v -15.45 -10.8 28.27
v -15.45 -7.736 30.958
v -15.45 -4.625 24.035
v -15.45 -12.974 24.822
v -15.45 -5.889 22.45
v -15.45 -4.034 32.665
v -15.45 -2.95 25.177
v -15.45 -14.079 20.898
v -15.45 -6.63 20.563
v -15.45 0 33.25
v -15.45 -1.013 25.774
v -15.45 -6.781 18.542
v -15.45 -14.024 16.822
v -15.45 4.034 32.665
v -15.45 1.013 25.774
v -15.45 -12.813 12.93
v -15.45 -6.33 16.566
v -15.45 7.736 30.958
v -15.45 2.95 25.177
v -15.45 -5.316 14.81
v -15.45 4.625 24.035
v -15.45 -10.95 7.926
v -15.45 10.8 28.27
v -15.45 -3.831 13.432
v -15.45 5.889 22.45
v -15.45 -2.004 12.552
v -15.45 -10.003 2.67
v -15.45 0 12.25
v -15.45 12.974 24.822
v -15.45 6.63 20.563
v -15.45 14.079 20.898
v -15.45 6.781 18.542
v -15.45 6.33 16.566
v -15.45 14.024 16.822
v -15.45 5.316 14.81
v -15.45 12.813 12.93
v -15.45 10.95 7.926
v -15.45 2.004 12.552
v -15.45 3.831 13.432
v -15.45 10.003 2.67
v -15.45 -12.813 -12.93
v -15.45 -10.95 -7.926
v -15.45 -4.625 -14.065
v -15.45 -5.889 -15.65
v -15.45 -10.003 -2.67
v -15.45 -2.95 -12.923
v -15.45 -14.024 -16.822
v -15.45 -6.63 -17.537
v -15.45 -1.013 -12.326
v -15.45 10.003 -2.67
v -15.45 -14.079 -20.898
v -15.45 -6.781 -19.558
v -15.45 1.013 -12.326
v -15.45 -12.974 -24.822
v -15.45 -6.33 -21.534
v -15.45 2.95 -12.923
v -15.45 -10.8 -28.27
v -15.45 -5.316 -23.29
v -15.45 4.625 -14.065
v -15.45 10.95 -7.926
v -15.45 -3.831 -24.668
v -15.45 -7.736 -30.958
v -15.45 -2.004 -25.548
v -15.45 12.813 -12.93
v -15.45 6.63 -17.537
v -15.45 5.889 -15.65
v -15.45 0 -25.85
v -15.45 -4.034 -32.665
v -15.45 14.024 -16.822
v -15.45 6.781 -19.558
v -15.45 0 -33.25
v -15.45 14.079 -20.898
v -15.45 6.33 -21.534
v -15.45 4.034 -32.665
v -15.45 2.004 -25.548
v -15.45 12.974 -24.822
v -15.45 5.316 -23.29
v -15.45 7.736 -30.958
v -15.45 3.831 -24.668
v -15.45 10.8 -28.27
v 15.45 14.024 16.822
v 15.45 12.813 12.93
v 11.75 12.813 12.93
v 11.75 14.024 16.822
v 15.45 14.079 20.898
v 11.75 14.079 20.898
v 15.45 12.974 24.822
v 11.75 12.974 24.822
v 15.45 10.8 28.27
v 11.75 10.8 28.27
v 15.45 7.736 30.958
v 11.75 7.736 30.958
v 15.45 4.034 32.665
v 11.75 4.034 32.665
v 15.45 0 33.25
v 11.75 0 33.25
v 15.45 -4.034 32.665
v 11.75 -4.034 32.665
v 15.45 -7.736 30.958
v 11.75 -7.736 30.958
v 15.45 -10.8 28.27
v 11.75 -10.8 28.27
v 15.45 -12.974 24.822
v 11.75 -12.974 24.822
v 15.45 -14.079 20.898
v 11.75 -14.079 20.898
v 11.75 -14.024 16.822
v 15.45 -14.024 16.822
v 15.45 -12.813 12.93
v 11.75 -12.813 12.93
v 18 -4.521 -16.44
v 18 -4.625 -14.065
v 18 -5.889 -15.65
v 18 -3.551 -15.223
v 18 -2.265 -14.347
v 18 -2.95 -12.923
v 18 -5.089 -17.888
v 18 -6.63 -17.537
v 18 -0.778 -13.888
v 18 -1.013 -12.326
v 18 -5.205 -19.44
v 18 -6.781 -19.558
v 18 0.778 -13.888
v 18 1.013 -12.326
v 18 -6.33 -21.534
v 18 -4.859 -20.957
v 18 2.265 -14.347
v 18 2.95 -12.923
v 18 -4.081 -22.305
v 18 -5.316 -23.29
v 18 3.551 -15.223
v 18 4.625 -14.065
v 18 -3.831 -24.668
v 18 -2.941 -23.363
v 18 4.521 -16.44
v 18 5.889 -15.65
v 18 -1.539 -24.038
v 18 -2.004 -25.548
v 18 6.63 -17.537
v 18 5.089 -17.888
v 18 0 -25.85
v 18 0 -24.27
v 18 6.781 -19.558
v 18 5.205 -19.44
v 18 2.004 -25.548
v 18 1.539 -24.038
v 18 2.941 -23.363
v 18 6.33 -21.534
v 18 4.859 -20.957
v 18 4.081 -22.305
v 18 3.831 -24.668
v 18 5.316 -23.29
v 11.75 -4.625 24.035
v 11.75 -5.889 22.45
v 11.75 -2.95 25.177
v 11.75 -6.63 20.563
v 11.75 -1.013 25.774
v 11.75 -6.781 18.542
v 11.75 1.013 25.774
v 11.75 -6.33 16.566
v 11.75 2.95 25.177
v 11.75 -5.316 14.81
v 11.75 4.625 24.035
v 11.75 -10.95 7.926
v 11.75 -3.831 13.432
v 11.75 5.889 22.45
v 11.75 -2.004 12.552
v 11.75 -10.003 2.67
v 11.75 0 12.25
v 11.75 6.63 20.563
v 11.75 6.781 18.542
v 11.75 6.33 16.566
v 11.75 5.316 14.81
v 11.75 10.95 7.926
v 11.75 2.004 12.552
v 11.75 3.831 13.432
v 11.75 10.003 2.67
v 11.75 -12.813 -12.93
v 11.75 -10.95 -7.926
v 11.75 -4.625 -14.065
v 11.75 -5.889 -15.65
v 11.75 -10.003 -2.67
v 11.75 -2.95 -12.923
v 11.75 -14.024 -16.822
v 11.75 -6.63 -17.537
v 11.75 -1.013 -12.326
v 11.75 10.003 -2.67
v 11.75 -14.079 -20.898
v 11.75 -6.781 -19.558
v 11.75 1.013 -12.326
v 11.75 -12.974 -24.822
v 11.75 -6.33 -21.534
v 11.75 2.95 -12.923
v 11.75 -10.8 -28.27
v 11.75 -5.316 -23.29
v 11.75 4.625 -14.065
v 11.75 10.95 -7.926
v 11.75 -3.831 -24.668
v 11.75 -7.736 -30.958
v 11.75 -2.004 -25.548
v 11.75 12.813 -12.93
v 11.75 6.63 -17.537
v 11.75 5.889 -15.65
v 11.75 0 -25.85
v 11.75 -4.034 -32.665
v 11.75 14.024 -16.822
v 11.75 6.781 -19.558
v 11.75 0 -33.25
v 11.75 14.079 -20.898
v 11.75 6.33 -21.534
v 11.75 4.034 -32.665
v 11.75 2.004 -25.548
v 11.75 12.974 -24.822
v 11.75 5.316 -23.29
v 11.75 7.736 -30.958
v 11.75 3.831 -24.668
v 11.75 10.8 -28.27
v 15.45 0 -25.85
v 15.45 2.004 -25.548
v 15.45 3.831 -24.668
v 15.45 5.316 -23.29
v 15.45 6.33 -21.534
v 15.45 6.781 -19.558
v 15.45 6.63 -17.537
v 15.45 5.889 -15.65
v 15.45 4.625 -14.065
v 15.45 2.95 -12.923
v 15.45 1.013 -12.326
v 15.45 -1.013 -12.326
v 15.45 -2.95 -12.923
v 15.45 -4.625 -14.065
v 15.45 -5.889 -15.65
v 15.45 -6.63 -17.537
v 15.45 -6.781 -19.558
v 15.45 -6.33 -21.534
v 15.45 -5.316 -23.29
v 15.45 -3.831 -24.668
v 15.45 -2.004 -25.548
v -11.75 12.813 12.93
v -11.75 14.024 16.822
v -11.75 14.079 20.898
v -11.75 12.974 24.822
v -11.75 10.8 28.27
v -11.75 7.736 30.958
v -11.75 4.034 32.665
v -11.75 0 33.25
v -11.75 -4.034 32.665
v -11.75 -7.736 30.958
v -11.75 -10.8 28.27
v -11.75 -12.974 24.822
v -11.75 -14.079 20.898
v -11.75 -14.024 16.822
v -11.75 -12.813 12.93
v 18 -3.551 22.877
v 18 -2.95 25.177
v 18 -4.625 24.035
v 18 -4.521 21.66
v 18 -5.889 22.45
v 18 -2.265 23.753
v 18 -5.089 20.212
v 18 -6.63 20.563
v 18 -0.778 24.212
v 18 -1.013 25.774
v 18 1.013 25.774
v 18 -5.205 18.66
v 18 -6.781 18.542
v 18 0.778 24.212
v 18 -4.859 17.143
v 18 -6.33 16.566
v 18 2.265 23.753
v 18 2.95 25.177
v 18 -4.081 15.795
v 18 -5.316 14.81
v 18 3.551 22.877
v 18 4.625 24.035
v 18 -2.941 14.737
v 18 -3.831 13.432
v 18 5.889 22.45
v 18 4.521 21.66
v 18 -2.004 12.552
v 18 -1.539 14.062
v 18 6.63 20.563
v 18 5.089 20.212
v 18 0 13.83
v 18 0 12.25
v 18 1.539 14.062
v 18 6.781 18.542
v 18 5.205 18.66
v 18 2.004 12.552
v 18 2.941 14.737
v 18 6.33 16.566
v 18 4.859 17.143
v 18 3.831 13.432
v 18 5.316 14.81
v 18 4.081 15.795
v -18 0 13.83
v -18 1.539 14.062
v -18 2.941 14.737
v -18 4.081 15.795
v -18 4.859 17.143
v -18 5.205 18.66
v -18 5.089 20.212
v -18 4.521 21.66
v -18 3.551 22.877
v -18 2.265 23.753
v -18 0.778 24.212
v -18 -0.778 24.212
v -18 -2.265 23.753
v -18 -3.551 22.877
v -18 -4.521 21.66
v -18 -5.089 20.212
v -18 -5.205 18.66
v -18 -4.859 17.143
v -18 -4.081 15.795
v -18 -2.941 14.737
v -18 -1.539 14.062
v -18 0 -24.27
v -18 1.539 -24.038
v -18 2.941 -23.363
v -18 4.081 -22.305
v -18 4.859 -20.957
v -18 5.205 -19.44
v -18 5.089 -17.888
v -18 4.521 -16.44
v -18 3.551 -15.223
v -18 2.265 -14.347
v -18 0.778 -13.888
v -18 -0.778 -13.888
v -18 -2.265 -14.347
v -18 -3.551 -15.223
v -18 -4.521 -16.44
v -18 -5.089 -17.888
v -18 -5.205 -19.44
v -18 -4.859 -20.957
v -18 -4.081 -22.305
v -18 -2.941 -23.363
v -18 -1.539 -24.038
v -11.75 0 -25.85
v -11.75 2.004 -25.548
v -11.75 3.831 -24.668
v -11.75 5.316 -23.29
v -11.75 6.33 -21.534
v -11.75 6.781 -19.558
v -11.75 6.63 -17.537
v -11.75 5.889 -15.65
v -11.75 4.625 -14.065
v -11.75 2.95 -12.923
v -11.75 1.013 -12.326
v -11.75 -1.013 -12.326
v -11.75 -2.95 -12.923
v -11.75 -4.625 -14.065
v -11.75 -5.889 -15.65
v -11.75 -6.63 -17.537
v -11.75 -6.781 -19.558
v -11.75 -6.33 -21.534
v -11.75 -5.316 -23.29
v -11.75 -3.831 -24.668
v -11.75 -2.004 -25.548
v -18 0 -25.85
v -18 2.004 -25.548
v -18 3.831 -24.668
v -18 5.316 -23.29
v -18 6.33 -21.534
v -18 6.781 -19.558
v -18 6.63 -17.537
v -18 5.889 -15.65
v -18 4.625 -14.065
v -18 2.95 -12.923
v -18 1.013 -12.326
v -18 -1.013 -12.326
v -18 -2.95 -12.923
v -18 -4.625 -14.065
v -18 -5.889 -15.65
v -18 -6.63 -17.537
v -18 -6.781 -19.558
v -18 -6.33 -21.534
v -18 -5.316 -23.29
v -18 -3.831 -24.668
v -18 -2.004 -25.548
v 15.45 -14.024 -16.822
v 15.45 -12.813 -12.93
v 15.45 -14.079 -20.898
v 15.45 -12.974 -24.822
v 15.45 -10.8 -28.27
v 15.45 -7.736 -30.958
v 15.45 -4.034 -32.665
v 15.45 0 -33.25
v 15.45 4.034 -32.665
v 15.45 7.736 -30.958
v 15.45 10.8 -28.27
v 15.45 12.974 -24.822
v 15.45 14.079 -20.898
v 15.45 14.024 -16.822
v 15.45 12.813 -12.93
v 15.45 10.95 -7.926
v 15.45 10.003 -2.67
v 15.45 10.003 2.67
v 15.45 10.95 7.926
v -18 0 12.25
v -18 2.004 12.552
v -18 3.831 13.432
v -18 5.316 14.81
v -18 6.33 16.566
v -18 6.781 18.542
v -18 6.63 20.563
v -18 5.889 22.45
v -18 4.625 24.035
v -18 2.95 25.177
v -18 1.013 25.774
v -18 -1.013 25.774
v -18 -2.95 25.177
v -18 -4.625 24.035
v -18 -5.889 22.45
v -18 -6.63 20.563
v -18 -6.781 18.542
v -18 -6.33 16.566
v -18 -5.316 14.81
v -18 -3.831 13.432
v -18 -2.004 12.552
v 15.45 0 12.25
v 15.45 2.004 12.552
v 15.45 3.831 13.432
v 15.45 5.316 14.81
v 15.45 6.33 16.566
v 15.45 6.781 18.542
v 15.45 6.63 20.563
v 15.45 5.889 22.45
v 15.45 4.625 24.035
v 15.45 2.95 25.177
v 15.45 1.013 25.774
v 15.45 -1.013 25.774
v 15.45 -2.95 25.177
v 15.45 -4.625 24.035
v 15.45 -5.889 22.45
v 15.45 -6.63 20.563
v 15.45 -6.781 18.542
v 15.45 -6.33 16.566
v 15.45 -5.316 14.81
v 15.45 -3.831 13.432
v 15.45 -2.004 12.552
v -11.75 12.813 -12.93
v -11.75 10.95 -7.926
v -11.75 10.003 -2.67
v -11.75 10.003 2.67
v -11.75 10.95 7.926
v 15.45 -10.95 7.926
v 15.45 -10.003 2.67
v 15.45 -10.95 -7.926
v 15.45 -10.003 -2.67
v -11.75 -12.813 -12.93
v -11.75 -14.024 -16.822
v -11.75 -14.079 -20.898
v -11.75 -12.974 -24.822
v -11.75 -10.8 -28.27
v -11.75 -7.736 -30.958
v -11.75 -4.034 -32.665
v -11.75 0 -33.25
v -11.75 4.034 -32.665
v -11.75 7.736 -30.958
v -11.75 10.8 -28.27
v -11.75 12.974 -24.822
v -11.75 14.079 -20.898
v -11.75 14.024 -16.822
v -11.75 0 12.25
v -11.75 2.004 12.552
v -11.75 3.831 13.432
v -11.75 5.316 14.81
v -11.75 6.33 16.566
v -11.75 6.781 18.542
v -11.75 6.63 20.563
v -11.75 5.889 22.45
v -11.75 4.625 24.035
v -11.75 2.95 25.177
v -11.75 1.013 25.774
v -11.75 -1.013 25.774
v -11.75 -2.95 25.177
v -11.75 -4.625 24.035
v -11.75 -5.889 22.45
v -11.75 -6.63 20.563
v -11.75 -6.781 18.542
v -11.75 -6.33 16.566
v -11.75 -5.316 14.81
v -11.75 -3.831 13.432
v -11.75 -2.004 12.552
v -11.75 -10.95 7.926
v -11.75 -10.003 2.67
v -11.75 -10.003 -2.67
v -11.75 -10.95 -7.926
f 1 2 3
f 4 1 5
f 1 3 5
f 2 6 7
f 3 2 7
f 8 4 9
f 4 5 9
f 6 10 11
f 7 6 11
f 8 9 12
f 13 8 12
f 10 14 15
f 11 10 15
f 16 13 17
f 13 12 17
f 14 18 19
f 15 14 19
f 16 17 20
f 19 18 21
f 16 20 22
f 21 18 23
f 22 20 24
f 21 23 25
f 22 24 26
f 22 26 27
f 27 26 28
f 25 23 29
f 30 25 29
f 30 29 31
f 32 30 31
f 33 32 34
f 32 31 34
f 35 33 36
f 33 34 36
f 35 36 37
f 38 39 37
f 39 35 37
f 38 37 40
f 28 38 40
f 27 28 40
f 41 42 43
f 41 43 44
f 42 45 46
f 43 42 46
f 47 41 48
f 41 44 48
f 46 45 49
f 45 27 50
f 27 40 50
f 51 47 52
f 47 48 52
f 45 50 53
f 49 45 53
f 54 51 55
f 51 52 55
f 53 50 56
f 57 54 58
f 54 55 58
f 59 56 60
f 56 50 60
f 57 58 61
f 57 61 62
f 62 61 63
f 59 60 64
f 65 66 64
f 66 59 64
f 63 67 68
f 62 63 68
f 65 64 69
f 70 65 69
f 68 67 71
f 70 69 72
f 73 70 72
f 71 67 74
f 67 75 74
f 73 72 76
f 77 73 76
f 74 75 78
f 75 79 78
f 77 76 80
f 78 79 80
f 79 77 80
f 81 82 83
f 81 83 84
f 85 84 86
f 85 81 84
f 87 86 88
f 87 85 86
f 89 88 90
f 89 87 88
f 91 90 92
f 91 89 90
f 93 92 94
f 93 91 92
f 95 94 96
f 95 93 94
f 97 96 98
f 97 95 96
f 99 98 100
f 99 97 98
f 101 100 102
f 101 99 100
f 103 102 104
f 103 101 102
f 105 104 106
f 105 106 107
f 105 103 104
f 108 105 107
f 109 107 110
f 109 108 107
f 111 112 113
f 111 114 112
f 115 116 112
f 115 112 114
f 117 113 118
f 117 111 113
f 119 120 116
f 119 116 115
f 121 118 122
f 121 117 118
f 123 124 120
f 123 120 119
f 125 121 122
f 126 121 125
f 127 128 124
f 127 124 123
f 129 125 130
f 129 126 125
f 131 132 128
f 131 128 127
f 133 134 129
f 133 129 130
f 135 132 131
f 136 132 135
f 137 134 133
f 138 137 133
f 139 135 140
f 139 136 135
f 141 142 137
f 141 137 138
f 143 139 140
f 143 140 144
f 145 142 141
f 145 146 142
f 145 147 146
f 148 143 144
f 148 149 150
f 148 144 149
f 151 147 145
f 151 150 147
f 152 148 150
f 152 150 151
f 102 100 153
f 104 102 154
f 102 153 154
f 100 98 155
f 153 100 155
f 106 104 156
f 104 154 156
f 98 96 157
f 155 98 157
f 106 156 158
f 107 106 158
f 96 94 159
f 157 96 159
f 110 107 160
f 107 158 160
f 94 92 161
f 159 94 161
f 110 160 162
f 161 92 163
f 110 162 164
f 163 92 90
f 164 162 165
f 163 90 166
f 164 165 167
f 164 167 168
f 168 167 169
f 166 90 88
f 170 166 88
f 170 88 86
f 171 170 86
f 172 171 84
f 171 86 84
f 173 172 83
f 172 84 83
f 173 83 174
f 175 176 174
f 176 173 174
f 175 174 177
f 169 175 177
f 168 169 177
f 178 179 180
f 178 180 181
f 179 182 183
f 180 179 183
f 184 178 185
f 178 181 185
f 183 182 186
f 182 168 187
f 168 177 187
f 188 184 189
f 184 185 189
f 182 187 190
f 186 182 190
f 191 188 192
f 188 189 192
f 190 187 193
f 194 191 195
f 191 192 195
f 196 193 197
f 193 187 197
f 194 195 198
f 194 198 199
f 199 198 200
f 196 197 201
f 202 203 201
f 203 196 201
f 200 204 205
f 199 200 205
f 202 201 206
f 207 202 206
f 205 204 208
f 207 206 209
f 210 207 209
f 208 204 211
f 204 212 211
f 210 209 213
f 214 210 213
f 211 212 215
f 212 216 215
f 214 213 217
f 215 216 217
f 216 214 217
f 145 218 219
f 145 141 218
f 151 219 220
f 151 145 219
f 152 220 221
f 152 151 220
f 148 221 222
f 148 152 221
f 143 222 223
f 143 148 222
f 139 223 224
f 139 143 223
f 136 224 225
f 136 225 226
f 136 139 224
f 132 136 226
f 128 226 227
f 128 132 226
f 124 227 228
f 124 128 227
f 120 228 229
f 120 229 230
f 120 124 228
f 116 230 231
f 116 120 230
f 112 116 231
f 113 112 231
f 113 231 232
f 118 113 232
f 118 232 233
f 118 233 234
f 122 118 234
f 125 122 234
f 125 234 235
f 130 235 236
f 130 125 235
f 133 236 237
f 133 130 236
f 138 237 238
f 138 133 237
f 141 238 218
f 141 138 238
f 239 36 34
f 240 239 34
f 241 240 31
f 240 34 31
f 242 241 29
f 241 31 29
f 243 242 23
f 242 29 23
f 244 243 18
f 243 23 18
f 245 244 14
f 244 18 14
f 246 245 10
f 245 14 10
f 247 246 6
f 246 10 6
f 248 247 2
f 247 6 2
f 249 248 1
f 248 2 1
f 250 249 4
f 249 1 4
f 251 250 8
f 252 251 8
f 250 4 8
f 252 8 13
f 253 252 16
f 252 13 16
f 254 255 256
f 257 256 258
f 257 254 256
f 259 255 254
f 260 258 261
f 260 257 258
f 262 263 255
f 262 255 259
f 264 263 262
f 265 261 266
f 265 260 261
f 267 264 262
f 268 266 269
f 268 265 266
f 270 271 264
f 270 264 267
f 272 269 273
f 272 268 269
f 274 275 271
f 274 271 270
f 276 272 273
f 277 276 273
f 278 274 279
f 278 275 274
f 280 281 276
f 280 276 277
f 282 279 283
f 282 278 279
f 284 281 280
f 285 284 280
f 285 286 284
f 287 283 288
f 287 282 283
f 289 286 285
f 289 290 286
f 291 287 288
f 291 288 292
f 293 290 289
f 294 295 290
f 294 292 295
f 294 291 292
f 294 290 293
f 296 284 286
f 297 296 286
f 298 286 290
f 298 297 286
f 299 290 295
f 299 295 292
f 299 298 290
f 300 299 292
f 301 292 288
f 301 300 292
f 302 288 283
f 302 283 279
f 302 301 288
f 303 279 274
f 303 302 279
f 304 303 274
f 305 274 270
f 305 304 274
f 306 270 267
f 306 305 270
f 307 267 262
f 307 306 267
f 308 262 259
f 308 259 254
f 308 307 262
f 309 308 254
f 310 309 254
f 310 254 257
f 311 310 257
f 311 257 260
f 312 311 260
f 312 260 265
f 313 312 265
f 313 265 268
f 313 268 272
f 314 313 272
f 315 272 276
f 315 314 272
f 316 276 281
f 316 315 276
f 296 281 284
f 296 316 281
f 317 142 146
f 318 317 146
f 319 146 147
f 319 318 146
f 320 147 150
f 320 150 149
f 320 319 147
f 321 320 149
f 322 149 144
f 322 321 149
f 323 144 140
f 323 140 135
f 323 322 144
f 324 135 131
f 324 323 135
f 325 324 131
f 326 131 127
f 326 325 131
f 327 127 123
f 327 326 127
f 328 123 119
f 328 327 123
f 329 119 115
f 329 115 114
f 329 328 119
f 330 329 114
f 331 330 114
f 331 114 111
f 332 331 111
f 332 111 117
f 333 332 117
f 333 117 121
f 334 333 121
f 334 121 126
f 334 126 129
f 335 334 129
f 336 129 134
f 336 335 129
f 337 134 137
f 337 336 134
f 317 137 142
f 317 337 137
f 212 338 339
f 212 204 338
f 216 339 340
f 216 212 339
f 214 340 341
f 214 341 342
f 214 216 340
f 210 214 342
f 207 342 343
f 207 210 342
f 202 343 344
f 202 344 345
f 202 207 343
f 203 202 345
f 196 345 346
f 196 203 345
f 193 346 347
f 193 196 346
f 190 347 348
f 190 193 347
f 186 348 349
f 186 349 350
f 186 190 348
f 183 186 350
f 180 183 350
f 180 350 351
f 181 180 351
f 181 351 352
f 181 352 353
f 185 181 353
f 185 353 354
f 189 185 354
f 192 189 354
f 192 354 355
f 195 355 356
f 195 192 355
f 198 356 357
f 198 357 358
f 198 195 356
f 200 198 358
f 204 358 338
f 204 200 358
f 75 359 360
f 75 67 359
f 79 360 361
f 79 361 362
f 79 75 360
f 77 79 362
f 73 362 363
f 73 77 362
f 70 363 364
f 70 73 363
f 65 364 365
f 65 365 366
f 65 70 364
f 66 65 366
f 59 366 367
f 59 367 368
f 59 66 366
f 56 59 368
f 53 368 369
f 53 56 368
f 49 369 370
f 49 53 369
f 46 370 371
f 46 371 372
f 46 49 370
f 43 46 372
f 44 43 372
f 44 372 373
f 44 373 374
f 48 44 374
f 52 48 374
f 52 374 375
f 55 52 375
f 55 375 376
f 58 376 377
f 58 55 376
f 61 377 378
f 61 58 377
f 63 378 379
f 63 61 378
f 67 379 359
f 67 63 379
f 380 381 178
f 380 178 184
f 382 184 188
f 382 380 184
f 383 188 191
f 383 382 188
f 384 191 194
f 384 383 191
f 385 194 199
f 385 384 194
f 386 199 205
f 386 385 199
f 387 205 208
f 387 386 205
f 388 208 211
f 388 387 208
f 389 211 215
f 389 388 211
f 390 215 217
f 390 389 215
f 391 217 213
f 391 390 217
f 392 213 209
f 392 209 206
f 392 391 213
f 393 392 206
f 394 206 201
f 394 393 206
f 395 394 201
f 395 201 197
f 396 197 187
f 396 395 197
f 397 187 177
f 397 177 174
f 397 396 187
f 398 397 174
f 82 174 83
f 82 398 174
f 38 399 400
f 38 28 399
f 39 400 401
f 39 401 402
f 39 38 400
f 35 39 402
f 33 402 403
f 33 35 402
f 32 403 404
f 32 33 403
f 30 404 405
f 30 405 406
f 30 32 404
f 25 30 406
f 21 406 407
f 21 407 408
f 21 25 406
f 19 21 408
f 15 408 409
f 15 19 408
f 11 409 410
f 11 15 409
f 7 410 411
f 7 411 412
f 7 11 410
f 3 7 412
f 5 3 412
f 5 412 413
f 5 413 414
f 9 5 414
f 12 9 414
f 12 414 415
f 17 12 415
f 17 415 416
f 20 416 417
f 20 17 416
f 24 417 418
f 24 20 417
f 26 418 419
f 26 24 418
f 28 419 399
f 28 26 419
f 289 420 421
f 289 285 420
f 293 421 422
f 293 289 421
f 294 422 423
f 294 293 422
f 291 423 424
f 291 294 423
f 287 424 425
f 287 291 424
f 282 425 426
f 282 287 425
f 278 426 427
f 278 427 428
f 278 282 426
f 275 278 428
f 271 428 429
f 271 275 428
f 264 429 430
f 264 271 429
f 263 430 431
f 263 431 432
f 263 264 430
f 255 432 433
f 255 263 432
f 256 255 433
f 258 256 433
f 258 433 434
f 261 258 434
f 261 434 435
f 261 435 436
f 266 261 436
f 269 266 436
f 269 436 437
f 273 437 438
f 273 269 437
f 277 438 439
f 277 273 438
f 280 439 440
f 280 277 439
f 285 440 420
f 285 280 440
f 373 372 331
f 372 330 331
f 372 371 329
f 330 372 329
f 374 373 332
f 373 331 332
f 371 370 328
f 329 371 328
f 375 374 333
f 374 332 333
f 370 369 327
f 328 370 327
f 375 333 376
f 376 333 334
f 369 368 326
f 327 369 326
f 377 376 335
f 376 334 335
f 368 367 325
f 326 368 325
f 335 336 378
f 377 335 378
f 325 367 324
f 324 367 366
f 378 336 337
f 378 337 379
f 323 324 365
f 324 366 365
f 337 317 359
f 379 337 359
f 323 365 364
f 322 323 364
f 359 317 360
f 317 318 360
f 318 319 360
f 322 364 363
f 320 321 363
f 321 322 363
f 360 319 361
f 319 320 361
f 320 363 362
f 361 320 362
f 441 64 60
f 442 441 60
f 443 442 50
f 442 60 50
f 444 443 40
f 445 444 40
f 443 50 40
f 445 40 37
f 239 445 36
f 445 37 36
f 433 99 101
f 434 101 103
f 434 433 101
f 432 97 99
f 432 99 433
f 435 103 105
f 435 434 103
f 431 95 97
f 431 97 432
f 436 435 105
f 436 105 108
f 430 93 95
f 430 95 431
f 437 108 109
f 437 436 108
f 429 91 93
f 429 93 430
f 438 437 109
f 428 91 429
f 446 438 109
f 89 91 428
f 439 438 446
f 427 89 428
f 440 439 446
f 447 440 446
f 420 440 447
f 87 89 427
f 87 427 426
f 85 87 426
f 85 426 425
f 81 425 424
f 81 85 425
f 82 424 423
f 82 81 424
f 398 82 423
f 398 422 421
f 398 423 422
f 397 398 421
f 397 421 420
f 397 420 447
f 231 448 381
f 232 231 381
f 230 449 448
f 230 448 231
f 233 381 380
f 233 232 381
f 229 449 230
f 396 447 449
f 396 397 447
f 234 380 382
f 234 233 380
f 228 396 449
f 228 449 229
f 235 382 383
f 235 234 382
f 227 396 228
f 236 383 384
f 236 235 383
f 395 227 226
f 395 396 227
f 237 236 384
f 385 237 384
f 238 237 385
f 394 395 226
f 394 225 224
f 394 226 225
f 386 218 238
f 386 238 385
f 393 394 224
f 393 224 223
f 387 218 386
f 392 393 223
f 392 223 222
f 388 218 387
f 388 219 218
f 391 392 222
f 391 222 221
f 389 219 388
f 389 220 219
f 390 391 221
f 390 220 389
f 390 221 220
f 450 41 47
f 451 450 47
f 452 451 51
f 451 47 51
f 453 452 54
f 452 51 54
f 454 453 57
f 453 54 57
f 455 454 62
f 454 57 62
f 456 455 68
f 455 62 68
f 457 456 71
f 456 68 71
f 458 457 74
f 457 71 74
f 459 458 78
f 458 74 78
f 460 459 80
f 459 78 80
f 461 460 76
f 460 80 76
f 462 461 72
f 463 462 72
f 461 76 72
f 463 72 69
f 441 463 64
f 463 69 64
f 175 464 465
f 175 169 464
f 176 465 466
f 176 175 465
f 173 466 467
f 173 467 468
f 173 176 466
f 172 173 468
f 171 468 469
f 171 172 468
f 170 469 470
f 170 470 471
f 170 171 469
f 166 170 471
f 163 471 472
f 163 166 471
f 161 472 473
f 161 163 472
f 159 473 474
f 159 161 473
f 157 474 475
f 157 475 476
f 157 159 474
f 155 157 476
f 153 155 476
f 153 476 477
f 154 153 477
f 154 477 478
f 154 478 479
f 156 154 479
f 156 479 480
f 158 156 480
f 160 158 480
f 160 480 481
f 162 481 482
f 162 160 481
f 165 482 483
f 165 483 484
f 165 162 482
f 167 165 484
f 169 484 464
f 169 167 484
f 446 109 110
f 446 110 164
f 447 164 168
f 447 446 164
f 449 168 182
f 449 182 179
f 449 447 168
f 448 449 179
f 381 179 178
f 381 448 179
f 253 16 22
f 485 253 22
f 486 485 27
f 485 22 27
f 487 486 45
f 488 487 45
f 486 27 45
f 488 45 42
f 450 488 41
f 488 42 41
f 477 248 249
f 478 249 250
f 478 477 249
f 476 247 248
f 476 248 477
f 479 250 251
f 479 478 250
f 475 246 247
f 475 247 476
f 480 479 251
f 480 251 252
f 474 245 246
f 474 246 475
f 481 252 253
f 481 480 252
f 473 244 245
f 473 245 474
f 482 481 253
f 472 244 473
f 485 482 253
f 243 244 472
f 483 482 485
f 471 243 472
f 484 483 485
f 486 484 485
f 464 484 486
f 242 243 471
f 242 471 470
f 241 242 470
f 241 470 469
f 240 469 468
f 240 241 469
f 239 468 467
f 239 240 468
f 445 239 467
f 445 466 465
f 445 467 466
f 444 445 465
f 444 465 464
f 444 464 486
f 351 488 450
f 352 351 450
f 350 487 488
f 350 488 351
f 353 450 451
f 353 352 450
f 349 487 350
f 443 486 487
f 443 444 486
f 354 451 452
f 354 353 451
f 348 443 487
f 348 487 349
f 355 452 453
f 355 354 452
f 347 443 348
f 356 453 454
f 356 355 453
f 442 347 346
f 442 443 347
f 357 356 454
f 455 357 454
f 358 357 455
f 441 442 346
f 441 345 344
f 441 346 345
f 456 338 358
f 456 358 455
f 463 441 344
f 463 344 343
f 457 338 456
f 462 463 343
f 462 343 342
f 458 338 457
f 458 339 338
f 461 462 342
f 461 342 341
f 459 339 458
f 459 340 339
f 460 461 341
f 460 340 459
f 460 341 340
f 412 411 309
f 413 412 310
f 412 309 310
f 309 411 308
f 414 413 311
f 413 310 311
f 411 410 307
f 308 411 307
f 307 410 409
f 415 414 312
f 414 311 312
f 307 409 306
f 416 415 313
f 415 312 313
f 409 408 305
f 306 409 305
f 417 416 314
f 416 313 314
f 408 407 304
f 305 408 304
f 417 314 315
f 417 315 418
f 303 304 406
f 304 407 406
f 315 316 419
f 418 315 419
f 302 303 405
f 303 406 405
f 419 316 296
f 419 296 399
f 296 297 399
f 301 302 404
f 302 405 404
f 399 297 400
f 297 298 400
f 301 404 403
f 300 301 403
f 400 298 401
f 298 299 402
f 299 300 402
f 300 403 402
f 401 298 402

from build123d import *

# Parameters (mm, degrees)
SKETCH_1_R        = 6.8
SKETCH_1_R_2      = 5.22
EXTRUDE_1_DEPTH   = 18
EXTRUDE_1_2_DEPTH = 18
EXTRUDE_START     = 15.45
SKETCH_3_R        = 6.8
EXTRUDE_3_DEPTH   = 3.7


with BuildPart() as part:
    # Эскиз1 → Бобышка-Вытянуть1 (new, symmetric)
    with BuildSketch(Plane(origin=(0, 0, 0), x_dir=(0, 0, -1), z_dir=(1, 0, 0))):
        with Locations((-19.05, 0)):
            Circle(SKETCH_1_R)
        with Locations((-19.05, 0)):
            Circle(SKETCH_1_R_2, mode=Mode.SUBTRACT)
    extrude(amount=EXTRUDE_1_DEPTH, both=True)



with BuildPart() as body_2:
    # Эскиз1 → Extrude 1 2 (new, symmetric)
    with BuildSketch(Plane(origin=(0, 0, 0), x_dir=(0, 0, -1), z_dir=(1, 0, 0))):
        with Locations((19.05, 0)):
            Circle(SKETCH_1_R)
        with Locations((19.05, 0)):
            Circle(SKETCH_1_R_2, mode=Mode.SUBTRACT)
    extrude(amount=EXTRUDE_1_2_DEPTH, both=True)


with BuildPart() as part_1:
    add(part.part)

    add(body_2.part)  # Бобышка-Вытянуть3 merges body 2
    # Эскиз3 → Бобышка-Вытянуть3 (add)
    with BuildSketch(Plane(origin=(0, 0, 0), x_dir=(0, 0, -1), z_dir=(1, 0, 0)).offset(EXTRUDE_START)):
        with BuildLine():
            ThreePointArc((-12.929864253, 12.813428052), (-33.25, 0), (-12.929864253, -12.813428052))
            ThreePointArc((-12.929864253, -12.813428052), (0, -9.884050697), (12.929864253, -12.813428052))
            ThreePointArc((12.929864253, -12.813428052), (33.25, 0), (12.929864253, 12.813428052))
            ThreePointArc((12.929864253, 12.813428052), (0, 9.884050697), (-12.929864253, 12.813428052))
        make_face()
        with Locations((-19.05, 0)):
            Circle(SKETCH_3_R, mode=Mode.SUBTRACT)
        with Locations((19.05, 0)):
            Circle(SKETCH_3_R, mode=Mode.SUBTRACT)
    extrude_3 = extrude(amount=-EXTRUDE_3_DEPTH)

    # Зеркальное отражение1: Бобышка-Вытянуть3 across plane
    add(extrude_3.mirror(Plane(origin=(0, 0, 0), x_dir=(0, 0, 1), z_dir=(1, 0, 0))))


solid = part_1.part
